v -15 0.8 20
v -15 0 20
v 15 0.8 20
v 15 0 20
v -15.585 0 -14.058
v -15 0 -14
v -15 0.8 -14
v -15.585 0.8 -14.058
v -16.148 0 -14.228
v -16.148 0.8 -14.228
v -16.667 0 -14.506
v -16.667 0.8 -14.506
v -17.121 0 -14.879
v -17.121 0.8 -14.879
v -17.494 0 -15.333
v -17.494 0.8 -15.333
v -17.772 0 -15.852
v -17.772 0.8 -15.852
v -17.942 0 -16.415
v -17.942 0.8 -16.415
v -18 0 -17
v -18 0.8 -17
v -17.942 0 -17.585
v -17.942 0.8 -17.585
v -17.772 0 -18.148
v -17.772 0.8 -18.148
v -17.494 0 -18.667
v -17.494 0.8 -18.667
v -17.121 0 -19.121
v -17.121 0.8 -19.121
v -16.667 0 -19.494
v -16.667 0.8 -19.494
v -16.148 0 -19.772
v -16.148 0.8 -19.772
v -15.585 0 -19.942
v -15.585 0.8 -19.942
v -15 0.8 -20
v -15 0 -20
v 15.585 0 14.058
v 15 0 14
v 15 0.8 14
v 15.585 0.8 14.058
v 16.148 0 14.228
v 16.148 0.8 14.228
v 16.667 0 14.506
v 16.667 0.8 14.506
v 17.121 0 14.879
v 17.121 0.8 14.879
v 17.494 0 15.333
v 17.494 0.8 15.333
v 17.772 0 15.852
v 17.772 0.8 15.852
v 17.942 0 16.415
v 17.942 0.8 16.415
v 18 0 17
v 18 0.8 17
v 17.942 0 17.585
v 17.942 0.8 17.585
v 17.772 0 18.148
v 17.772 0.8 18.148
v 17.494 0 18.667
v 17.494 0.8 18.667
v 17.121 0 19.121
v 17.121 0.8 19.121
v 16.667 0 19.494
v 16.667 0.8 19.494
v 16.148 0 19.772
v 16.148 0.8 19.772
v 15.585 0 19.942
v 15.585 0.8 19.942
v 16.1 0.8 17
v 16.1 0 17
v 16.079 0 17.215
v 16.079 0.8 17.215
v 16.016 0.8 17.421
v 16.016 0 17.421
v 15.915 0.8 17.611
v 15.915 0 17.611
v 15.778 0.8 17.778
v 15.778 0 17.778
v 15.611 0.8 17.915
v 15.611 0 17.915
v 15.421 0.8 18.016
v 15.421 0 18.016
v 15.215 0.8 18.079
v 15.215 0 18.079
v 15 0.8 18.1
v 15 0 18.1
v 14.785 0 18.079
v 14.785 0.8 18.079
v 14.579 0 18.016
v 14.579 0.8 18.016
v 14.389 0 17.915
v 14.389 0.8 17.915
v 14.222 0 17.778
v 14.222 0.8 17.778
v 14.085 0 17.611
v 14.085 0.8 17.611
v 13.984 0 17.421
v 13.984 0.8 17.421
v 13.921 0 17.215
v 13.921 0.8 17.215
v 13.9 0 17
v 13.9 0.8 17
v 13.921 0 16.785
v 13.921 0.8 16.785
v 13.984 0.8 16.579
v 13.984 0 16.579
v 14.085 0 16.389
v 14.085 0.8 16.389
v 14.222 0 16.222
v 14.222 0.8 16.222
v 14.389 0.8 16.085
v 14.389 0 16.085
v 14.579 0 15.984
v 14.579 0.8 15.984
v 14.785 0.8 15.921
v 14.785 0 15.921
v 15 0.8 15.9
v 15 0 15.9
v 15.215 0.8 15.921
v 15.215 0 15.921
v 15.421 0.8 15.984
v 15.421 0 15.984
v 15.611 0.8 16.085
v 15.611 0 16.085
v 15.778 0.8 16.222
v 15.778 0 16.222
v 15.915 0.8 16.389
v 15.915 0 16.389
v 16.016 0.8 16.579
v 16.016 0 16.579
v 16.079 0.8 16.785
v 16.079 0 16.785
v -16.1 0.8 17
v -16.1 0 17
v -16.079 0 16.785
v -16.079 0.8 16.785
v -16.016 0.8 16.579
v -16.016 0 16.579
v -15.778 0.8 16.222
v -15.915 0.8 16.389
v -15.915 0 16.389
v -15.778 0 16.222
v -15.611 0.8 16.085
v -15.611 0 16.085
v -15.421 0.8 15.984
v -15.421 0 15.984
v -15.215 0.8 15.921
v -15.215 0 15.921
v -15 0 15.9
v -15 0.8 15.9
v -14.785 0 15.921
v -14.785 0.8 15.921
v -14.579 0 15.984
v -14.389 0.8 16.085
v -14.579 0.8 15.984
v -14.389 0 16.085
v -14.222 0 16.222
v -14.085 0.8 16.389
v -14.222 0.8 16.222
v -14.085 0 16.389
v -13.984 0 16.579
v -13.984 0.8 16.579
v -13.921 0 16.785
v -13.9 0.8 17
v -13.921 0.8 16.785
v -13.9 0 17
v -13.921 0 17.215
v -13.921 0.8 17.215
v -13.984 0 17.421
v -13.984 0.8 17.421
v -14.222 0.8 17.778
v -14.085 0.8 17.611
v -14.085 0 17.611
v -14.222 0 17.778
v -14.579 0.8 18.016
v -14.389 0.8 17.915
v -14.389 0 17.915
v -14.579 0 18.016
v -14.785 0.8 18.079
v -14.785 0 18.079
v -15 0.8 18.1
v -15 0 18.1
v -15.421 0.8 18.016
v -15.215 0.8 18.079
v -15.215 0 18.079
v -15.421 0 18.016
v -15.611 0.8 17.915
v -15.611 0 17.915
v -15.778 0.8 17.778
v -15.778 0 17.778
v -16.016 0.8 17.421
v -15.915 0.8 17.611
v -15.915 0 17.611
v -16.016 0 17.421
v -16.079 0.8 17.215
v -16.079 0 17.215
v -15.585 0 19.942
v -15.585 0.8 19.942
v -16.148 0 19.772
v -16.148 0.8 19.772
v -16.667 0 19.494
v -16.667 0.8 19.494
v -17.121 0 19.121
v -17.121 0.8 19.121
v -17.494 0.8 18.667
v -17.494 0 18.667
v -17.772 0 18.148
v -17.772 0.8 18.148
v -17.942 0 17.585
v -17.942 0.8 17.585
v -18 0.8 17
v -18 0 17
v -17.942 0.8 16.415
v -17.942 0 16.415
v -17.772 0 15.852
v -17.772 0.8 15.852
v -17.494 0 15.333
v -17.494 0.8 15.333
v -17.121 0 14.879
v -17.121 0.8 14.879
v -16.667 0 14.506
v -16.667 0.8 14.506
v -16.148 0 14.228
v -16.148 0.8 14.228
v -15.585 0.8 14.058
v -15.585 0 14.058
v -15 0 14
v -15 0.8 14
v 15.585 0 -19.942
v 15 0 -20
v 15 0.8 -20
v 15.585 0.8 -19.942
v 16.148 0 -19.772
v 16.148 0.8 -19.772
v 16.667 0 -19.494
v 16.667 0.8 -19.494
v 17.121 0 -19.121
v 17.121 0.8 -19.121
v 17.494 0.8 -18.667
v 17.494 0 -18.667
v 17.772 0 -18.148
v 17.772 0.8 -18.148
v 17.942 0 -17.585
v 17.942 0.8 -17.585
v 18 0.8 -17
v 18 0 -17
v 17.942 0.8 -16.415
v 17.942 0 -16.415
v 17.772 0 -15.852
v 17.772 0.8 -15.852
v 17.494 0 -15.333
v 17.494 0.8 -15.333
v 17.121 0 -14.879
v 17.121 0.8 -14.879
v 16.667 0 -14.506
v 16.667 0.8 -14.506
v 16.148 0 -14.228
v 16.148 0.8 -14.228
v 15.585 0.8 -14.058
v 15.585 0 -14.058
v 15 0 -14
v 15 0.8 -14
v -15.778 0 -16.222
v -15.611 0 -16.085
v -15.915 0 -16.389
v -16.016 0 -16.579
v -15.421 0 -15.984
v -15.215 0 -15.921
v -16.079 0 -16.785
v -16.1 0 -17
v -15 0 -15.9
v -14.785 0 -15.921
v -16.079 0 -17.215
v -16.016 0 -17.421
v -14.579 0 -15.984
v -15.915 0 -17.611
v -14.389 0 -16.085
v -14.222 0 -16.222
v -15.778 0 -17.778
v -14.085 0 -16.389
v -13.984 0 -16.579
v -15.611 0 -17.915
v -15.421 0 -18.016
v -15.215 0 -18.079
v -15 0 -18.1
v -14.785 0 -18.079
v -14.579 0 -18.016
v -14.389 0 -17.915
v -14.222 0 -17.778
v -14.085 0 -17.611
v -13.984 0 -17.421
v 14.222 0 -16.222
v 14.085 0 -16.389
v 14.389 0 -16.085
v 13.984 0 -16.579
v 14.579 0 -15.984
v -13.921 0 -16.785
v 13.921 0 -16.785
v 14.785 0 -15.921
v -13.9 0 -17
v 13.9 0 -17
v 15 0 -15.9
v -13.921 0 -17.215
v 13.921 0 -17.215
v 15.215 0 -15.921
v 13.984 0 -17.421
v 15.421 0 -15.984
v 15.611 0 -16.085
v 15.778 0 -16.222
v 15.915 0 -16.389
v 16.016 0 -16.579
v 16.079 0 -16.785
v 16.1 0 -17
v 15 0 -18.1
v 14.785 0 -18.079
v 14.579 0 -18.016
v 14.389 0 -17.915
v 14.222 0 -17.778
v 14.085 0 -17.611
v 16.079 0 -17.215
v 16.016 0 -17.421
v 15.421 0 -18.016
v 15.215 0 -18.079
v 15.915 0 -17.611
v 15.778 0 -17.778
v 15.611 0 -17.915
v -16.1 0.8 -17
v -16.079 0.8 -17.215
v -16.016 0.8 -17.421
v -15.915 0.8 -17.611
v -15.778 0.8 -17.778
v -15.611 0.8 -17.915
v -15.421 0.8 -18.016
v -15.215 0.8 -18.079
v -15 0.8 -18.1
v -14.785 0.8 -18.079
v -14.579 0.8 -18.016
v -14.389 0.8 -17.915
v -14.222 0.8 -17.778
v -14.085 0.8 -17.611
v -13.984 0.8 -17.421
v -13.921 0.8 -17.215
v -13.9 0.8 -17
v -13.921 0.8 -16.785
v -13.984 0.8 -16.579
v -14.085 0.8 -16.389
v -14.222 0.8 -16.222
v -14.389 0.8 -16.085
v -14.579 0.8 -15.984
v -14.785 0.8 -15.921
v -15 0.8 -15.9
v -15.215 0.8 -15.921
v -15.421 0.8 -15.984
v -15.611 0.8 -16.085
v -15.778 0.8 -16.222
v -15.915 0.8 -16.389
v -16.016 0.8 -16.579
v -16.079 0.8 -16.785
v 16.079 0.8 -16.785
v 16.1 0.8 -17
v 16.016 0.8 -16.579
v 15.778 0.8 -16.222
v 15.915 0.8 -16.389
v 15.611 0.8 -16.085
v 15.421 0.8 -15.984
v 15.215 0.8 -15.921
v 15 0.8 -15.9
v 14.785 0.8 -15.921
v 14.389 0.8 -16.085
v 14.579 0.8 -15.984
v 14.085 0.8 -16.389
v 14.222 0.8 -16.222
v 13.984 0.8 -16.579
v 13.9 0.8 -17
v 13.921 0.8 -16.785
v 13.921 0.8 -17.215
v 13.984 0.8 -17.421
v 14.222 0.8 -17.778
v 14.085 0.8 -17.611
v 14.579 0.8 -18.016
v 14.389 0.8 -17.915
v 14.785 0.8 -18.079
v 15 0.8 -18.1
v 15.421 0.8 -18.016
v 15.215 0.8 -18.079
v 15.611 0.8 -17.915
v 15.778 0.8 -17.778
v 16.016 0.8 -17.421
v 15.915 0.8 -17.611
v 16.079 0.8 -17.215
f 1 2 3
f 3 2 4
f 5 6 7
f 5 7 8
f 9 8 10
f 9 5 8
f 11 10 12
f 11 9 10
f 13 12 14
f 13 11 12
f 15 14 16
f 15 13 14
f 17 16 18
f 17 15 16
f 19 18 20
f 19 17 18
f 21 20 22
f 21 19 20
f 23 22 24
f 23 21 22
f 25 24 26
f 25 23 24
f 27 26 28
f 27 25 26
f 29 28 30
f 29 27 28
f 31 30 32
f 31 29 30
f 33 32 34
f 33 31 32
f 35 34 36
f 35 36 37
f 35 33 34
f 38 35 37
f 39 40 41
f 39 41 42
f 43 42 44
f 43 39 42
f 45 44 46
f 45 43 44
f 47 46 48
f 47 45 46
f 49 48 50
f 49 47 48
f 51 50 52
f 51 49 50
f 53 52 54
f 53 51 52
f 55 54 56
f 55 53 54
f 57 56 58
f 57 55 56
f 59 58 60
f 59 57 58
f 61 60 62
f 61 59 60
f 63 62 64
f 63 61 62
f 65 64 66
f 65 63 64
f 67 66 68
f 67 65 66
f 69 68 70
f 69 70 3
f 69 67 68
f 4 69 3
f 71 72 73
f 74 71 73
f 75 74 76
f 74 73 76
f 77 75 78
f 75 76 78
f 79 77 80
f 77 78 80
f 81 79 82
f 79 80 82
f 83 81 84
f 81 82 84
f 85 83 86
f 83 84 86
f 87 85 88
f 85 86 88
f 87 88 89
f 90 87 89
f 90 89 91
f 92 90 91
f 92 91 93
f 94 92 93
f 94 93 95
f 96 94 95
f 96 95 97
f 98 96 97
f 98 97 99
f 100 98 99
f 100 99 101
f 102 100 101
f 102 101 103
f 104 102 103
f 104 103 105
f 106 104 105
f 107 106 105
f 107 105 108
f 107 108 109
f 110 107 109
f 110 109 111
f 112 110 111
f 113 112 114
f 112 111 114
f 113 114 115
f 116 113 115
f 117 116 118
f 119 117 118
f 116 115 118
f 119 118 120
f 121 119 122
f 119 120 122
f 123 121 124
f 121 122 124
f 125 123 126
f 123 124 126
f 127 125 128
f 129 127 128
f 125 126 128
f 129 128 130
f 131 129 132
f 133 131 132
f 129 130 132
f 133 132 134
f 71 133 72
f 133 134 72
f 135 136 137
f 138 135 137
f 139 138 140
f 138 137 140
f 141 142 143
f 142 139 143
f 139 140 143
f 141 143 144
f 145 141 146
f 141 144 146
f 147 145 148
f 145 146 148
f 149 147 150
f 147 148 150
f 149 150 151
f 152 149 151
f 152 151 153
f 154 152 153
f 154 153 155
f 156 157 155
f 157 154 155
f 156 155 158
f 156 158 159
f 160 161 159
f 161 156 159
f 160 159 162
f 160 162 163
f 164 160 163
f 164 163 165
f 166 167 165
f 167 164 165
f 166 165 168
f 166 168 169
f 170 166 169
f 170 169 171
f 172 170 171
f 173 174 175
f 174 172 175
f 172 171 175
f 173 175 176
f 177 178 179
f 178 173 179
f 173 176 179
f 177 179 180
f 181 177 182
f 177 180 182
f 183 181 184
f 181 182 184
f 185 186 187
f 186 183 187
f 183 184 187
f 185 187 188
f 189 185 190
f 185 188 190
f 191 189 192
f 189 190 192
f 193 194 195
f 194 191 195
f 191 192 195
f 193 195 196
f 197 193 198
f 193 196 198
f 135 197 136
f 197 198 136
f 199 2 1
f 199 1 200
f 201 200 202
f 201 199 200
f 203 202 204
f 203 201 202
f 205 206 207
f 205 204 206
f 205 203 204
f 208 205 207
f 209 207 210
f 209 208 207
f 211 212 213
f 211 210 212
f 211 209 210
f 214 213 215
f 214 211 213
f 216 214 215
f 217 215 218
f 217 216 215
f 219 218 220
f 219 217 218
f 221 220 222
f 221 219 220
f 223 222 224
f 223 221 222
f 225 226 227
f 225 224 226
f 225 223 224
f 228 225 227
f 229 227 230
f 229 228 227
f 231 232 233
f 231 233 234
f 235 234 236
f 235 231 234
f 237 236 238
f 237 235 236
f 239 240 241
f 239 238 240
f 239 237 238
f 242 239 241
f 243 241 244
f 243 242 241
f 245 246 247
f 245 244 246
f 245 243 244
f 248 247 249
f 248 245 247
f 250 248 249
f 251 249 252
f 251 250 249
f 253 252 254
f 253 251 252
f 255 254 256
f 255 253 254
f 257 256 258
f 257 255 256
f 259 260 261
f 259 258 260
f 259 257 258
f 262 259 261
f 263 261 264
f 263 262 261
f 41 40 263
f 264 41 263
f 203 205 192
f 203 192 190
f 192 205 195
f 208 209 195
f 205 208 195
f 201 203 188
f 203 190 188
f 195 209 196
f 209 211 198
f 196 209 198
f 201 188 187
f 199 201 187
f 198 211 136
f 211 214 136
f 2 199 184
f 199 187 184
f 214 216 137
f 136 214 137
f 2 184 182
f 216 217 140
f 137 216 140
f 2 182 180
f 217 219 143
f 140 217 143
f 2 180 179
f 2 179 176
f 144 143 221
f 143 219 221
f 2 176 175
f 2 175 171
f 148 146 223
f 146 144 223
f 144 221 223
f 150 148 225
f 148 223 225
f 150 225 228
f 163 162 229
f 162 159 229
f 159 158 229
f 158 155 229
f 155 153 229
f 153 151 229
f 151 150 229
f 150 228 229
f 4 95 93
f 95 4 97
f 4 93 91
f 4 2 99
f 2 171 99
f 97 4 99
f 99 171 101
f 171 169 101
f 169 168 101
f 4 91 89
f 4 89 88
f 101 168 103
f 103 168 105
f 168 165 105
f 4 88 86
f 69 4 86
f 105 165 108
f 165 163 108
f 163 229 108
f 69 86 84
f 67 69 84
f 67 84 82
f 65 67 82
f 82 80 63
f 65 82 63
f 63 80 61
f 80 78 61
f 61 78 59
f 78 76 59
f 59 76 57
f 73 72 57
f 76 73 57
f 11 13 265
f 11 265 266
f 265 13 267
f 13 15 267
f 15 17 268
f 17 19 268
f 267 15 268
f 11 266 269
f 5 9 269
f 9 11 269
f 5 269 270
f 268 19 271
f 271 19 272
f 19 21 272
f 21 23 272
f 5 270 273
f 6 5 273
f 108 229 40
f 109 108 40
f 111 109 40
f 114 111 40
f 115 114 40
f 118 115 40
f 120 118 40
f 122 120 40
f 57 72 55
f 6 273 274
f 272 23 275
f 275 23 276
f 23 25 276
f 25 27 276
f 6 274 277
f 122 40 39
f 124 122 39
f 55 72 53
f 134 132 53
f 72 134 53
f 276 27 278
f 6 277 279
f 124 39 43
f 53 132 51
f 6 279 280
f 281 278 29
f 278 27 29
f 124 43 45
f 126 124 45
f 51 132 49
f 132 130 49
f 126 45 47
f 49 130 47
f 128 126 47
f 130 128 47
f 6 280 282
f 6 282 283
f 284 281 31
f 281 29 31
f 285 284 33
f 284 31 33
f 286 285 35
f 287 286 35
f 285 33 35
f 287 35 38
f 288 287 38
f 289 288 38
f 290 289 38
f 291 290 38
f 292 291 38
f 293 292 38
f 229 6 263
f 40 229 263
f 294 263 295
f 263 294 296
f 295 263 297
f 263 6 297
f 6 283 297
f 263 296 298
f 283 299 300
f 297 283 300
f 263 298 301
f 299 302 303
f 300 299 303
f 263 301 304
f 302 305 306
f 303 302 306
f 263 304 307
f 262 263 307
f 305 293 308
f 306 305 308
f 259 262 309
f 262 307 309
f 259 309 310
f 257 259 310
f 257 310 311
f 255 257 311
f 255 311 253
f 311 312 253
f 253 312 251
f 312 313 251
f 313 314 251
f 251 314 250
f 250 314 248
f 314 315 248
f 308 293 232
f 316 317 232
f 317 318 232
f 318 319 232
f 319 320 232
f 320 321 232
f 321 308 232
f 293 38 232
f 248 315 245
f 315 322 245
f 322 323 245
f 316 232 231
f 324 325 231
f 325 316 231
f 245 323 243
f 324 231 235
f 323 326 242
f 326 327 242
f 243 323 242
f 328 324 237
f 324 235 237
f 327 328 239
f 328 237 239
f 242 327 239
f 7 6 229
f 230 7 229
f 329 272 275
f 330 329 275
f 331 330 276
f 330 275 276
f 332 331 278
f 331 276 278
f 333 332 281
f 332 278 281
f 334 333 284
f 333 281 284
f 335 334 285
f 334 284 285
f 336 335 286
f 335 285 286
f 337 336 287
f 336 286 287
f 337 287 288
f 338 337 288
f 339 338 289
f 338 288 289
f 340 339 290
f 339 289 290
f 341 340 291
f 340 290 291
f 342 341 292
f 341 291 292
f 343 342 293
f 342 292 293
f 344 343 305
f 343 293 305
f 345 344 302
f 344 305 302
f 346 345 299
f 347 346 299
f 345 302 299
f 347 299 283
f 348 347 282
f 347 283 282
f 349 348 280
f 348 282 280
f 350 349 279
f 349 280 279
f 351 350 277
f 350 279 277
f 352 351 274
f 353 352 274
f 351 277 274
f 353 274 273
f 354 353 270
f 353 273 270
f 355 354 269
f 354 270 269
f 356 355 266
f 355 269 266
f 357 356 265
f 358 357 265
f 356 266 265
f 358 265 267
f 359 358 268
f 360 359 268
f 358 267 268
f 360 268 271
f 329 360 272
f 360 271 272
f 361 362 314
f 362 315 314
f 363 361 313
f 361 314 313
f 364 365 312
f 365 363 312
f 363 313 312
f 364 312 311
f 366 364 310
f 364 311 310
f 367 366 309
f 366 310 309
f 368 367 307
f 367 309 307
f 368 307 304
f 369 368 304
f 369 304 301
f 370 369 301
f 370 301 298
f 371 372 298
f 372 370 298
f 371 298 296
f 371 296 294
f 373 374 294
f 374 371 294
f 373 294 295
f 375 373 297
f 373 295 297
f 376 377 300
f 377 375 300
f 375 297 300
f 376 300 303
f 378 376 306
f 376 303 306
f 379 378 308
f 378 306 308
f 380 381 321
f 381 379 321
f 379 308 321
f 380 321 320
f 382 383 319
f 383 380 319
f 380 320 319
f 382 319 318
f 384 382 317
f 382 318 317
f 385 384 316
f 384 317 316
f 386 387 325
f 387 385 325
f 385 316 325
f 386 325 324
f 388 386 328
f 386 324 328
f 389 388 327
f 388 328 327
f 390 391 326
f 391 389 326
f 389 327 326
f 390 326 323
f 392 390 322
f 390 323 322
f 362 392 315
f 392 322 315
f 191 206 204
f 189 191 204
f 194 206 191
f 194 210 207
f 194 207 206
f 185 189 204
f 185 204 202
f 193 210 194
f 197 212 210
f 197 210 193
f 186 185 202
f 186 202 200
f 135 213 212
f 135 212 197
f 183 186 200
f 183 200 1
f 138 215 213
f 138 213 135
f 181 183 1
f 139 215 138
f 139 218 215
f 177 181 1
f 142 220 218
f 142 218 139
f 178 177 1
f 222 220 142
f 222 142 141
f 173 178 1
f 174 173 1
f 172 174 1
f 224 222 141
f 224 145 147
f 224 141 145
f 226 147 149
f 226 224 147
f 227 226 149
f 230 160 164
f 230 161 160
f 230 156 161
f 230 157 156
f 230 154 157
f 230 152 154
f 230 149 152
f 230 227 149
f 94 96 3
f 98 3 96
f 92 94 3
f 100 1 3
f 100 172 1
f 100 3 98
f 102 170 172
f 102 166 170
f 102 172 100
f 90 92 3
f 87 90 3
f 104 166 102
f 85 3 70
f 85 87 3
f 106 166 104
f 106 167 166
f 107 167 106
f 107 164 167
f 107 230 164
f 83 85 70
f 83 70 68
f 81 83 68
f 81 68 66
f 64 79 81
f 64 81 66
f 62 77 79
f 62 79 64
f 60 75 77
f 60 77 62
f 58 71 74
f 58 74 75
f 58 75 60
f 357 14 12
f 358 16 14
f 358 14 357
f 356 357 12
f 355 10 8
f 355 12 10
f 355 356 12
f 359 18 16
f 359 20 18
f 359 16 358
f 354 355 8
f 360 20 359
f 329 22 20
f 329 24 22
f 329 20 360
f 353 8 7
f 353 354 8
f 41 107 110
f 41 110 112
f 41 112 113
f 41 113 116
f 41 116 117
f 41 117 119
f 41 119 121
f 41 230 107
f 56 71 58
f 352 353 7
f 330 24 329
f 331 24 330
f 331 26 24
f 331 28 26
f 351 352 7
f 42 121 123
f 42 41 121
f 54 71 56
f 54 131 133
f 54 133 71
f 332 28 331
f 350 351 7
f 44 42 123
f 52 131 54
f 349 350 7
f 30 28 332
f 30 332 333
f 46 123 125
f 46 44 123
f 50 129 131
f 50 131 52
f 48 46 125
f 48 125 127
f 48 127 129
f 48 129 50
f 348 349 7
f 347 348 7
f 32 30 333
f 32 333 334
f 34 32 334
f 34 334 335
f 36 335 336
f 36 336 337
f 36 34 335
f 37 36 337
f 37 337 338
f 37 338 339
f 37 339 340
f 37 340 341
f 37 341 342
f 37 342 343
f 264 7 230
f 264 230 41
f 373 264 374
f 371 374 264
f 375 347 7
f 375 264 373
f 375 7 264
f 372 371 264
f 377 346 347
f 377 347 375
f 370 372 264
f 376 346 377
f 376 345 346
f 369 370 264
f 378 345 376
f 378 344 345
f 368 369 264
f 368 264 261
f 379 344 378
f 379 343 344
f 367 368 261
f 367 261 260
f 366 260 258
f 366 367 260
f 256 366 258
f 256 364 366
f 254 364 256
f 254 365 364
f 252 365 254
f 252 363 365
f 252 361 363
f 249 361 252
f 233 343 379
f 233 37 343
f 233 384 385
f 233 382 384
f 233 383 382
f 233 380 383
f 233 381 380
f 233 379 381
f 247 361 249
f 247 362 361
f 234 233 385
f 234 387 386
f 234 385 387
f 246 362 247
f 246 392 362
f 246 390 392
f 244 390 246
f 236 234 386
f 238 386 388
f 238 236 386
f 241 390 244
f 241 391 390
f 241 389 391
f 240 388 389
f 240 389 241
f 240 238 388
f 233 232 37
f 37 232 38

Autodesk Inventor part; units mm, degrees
ref_plane "YZ Plane" through (0, 0, 0) normal (1, 0, 0) x (0, 1, 0)
ref_plane "XZ Plane" through (0, 0, 0) normal (0, 1, 0) x (-1, 0, 0)
ref_plane "XY Plane" through (0, 0, 0) normal (0, 0, 1) x (1, 0, 0)
sketch "スケッチ1" plane through (0, 0, 0) normal (0, 1, 0) x (-1, 0, 0)
  line L0 (15, 20) -> (-15, 20)
  line L1 (-15, 20) -> (-15, -20)
  line L2 (-15, -20) -> (15, -20)
  line L3 (15, -20) -> (15, 14)
  arc A0 (15, 14) -> (15, 20) centre (15, 17) ccw
  line L4 (0, -20) -> (0, 20)
  line L5 (15, 0) -> (-15, 0)
  line L6 (15, 14) -> (15, 20) construction
  circle A1 centre (15, 17) radius 1.1
  arc A2 (15, 20) -> (15, 14) centre (15, 17) ccw construction
  point P0 (0, 0)
  point P1 (0, 0)
  dimension "d0" = 30
  dimension "d1" = 40
  dimension "d2" = 6
  dimension "d3" = 2.2
extrude "押し出し1" add sketch "スケッチ1" along normal blind 0.8 contours A0 L3 L5 L4 L0
mirror "ミラー1" about plane through (0, 0, 20) normal (1, 0, 0) of "押し出し1"
mirror "ミラー2" about plane through (0, 0, 0) normal (0, 0, -1) of "押し出し1", "ミラー1"
properties part number "kiban"
